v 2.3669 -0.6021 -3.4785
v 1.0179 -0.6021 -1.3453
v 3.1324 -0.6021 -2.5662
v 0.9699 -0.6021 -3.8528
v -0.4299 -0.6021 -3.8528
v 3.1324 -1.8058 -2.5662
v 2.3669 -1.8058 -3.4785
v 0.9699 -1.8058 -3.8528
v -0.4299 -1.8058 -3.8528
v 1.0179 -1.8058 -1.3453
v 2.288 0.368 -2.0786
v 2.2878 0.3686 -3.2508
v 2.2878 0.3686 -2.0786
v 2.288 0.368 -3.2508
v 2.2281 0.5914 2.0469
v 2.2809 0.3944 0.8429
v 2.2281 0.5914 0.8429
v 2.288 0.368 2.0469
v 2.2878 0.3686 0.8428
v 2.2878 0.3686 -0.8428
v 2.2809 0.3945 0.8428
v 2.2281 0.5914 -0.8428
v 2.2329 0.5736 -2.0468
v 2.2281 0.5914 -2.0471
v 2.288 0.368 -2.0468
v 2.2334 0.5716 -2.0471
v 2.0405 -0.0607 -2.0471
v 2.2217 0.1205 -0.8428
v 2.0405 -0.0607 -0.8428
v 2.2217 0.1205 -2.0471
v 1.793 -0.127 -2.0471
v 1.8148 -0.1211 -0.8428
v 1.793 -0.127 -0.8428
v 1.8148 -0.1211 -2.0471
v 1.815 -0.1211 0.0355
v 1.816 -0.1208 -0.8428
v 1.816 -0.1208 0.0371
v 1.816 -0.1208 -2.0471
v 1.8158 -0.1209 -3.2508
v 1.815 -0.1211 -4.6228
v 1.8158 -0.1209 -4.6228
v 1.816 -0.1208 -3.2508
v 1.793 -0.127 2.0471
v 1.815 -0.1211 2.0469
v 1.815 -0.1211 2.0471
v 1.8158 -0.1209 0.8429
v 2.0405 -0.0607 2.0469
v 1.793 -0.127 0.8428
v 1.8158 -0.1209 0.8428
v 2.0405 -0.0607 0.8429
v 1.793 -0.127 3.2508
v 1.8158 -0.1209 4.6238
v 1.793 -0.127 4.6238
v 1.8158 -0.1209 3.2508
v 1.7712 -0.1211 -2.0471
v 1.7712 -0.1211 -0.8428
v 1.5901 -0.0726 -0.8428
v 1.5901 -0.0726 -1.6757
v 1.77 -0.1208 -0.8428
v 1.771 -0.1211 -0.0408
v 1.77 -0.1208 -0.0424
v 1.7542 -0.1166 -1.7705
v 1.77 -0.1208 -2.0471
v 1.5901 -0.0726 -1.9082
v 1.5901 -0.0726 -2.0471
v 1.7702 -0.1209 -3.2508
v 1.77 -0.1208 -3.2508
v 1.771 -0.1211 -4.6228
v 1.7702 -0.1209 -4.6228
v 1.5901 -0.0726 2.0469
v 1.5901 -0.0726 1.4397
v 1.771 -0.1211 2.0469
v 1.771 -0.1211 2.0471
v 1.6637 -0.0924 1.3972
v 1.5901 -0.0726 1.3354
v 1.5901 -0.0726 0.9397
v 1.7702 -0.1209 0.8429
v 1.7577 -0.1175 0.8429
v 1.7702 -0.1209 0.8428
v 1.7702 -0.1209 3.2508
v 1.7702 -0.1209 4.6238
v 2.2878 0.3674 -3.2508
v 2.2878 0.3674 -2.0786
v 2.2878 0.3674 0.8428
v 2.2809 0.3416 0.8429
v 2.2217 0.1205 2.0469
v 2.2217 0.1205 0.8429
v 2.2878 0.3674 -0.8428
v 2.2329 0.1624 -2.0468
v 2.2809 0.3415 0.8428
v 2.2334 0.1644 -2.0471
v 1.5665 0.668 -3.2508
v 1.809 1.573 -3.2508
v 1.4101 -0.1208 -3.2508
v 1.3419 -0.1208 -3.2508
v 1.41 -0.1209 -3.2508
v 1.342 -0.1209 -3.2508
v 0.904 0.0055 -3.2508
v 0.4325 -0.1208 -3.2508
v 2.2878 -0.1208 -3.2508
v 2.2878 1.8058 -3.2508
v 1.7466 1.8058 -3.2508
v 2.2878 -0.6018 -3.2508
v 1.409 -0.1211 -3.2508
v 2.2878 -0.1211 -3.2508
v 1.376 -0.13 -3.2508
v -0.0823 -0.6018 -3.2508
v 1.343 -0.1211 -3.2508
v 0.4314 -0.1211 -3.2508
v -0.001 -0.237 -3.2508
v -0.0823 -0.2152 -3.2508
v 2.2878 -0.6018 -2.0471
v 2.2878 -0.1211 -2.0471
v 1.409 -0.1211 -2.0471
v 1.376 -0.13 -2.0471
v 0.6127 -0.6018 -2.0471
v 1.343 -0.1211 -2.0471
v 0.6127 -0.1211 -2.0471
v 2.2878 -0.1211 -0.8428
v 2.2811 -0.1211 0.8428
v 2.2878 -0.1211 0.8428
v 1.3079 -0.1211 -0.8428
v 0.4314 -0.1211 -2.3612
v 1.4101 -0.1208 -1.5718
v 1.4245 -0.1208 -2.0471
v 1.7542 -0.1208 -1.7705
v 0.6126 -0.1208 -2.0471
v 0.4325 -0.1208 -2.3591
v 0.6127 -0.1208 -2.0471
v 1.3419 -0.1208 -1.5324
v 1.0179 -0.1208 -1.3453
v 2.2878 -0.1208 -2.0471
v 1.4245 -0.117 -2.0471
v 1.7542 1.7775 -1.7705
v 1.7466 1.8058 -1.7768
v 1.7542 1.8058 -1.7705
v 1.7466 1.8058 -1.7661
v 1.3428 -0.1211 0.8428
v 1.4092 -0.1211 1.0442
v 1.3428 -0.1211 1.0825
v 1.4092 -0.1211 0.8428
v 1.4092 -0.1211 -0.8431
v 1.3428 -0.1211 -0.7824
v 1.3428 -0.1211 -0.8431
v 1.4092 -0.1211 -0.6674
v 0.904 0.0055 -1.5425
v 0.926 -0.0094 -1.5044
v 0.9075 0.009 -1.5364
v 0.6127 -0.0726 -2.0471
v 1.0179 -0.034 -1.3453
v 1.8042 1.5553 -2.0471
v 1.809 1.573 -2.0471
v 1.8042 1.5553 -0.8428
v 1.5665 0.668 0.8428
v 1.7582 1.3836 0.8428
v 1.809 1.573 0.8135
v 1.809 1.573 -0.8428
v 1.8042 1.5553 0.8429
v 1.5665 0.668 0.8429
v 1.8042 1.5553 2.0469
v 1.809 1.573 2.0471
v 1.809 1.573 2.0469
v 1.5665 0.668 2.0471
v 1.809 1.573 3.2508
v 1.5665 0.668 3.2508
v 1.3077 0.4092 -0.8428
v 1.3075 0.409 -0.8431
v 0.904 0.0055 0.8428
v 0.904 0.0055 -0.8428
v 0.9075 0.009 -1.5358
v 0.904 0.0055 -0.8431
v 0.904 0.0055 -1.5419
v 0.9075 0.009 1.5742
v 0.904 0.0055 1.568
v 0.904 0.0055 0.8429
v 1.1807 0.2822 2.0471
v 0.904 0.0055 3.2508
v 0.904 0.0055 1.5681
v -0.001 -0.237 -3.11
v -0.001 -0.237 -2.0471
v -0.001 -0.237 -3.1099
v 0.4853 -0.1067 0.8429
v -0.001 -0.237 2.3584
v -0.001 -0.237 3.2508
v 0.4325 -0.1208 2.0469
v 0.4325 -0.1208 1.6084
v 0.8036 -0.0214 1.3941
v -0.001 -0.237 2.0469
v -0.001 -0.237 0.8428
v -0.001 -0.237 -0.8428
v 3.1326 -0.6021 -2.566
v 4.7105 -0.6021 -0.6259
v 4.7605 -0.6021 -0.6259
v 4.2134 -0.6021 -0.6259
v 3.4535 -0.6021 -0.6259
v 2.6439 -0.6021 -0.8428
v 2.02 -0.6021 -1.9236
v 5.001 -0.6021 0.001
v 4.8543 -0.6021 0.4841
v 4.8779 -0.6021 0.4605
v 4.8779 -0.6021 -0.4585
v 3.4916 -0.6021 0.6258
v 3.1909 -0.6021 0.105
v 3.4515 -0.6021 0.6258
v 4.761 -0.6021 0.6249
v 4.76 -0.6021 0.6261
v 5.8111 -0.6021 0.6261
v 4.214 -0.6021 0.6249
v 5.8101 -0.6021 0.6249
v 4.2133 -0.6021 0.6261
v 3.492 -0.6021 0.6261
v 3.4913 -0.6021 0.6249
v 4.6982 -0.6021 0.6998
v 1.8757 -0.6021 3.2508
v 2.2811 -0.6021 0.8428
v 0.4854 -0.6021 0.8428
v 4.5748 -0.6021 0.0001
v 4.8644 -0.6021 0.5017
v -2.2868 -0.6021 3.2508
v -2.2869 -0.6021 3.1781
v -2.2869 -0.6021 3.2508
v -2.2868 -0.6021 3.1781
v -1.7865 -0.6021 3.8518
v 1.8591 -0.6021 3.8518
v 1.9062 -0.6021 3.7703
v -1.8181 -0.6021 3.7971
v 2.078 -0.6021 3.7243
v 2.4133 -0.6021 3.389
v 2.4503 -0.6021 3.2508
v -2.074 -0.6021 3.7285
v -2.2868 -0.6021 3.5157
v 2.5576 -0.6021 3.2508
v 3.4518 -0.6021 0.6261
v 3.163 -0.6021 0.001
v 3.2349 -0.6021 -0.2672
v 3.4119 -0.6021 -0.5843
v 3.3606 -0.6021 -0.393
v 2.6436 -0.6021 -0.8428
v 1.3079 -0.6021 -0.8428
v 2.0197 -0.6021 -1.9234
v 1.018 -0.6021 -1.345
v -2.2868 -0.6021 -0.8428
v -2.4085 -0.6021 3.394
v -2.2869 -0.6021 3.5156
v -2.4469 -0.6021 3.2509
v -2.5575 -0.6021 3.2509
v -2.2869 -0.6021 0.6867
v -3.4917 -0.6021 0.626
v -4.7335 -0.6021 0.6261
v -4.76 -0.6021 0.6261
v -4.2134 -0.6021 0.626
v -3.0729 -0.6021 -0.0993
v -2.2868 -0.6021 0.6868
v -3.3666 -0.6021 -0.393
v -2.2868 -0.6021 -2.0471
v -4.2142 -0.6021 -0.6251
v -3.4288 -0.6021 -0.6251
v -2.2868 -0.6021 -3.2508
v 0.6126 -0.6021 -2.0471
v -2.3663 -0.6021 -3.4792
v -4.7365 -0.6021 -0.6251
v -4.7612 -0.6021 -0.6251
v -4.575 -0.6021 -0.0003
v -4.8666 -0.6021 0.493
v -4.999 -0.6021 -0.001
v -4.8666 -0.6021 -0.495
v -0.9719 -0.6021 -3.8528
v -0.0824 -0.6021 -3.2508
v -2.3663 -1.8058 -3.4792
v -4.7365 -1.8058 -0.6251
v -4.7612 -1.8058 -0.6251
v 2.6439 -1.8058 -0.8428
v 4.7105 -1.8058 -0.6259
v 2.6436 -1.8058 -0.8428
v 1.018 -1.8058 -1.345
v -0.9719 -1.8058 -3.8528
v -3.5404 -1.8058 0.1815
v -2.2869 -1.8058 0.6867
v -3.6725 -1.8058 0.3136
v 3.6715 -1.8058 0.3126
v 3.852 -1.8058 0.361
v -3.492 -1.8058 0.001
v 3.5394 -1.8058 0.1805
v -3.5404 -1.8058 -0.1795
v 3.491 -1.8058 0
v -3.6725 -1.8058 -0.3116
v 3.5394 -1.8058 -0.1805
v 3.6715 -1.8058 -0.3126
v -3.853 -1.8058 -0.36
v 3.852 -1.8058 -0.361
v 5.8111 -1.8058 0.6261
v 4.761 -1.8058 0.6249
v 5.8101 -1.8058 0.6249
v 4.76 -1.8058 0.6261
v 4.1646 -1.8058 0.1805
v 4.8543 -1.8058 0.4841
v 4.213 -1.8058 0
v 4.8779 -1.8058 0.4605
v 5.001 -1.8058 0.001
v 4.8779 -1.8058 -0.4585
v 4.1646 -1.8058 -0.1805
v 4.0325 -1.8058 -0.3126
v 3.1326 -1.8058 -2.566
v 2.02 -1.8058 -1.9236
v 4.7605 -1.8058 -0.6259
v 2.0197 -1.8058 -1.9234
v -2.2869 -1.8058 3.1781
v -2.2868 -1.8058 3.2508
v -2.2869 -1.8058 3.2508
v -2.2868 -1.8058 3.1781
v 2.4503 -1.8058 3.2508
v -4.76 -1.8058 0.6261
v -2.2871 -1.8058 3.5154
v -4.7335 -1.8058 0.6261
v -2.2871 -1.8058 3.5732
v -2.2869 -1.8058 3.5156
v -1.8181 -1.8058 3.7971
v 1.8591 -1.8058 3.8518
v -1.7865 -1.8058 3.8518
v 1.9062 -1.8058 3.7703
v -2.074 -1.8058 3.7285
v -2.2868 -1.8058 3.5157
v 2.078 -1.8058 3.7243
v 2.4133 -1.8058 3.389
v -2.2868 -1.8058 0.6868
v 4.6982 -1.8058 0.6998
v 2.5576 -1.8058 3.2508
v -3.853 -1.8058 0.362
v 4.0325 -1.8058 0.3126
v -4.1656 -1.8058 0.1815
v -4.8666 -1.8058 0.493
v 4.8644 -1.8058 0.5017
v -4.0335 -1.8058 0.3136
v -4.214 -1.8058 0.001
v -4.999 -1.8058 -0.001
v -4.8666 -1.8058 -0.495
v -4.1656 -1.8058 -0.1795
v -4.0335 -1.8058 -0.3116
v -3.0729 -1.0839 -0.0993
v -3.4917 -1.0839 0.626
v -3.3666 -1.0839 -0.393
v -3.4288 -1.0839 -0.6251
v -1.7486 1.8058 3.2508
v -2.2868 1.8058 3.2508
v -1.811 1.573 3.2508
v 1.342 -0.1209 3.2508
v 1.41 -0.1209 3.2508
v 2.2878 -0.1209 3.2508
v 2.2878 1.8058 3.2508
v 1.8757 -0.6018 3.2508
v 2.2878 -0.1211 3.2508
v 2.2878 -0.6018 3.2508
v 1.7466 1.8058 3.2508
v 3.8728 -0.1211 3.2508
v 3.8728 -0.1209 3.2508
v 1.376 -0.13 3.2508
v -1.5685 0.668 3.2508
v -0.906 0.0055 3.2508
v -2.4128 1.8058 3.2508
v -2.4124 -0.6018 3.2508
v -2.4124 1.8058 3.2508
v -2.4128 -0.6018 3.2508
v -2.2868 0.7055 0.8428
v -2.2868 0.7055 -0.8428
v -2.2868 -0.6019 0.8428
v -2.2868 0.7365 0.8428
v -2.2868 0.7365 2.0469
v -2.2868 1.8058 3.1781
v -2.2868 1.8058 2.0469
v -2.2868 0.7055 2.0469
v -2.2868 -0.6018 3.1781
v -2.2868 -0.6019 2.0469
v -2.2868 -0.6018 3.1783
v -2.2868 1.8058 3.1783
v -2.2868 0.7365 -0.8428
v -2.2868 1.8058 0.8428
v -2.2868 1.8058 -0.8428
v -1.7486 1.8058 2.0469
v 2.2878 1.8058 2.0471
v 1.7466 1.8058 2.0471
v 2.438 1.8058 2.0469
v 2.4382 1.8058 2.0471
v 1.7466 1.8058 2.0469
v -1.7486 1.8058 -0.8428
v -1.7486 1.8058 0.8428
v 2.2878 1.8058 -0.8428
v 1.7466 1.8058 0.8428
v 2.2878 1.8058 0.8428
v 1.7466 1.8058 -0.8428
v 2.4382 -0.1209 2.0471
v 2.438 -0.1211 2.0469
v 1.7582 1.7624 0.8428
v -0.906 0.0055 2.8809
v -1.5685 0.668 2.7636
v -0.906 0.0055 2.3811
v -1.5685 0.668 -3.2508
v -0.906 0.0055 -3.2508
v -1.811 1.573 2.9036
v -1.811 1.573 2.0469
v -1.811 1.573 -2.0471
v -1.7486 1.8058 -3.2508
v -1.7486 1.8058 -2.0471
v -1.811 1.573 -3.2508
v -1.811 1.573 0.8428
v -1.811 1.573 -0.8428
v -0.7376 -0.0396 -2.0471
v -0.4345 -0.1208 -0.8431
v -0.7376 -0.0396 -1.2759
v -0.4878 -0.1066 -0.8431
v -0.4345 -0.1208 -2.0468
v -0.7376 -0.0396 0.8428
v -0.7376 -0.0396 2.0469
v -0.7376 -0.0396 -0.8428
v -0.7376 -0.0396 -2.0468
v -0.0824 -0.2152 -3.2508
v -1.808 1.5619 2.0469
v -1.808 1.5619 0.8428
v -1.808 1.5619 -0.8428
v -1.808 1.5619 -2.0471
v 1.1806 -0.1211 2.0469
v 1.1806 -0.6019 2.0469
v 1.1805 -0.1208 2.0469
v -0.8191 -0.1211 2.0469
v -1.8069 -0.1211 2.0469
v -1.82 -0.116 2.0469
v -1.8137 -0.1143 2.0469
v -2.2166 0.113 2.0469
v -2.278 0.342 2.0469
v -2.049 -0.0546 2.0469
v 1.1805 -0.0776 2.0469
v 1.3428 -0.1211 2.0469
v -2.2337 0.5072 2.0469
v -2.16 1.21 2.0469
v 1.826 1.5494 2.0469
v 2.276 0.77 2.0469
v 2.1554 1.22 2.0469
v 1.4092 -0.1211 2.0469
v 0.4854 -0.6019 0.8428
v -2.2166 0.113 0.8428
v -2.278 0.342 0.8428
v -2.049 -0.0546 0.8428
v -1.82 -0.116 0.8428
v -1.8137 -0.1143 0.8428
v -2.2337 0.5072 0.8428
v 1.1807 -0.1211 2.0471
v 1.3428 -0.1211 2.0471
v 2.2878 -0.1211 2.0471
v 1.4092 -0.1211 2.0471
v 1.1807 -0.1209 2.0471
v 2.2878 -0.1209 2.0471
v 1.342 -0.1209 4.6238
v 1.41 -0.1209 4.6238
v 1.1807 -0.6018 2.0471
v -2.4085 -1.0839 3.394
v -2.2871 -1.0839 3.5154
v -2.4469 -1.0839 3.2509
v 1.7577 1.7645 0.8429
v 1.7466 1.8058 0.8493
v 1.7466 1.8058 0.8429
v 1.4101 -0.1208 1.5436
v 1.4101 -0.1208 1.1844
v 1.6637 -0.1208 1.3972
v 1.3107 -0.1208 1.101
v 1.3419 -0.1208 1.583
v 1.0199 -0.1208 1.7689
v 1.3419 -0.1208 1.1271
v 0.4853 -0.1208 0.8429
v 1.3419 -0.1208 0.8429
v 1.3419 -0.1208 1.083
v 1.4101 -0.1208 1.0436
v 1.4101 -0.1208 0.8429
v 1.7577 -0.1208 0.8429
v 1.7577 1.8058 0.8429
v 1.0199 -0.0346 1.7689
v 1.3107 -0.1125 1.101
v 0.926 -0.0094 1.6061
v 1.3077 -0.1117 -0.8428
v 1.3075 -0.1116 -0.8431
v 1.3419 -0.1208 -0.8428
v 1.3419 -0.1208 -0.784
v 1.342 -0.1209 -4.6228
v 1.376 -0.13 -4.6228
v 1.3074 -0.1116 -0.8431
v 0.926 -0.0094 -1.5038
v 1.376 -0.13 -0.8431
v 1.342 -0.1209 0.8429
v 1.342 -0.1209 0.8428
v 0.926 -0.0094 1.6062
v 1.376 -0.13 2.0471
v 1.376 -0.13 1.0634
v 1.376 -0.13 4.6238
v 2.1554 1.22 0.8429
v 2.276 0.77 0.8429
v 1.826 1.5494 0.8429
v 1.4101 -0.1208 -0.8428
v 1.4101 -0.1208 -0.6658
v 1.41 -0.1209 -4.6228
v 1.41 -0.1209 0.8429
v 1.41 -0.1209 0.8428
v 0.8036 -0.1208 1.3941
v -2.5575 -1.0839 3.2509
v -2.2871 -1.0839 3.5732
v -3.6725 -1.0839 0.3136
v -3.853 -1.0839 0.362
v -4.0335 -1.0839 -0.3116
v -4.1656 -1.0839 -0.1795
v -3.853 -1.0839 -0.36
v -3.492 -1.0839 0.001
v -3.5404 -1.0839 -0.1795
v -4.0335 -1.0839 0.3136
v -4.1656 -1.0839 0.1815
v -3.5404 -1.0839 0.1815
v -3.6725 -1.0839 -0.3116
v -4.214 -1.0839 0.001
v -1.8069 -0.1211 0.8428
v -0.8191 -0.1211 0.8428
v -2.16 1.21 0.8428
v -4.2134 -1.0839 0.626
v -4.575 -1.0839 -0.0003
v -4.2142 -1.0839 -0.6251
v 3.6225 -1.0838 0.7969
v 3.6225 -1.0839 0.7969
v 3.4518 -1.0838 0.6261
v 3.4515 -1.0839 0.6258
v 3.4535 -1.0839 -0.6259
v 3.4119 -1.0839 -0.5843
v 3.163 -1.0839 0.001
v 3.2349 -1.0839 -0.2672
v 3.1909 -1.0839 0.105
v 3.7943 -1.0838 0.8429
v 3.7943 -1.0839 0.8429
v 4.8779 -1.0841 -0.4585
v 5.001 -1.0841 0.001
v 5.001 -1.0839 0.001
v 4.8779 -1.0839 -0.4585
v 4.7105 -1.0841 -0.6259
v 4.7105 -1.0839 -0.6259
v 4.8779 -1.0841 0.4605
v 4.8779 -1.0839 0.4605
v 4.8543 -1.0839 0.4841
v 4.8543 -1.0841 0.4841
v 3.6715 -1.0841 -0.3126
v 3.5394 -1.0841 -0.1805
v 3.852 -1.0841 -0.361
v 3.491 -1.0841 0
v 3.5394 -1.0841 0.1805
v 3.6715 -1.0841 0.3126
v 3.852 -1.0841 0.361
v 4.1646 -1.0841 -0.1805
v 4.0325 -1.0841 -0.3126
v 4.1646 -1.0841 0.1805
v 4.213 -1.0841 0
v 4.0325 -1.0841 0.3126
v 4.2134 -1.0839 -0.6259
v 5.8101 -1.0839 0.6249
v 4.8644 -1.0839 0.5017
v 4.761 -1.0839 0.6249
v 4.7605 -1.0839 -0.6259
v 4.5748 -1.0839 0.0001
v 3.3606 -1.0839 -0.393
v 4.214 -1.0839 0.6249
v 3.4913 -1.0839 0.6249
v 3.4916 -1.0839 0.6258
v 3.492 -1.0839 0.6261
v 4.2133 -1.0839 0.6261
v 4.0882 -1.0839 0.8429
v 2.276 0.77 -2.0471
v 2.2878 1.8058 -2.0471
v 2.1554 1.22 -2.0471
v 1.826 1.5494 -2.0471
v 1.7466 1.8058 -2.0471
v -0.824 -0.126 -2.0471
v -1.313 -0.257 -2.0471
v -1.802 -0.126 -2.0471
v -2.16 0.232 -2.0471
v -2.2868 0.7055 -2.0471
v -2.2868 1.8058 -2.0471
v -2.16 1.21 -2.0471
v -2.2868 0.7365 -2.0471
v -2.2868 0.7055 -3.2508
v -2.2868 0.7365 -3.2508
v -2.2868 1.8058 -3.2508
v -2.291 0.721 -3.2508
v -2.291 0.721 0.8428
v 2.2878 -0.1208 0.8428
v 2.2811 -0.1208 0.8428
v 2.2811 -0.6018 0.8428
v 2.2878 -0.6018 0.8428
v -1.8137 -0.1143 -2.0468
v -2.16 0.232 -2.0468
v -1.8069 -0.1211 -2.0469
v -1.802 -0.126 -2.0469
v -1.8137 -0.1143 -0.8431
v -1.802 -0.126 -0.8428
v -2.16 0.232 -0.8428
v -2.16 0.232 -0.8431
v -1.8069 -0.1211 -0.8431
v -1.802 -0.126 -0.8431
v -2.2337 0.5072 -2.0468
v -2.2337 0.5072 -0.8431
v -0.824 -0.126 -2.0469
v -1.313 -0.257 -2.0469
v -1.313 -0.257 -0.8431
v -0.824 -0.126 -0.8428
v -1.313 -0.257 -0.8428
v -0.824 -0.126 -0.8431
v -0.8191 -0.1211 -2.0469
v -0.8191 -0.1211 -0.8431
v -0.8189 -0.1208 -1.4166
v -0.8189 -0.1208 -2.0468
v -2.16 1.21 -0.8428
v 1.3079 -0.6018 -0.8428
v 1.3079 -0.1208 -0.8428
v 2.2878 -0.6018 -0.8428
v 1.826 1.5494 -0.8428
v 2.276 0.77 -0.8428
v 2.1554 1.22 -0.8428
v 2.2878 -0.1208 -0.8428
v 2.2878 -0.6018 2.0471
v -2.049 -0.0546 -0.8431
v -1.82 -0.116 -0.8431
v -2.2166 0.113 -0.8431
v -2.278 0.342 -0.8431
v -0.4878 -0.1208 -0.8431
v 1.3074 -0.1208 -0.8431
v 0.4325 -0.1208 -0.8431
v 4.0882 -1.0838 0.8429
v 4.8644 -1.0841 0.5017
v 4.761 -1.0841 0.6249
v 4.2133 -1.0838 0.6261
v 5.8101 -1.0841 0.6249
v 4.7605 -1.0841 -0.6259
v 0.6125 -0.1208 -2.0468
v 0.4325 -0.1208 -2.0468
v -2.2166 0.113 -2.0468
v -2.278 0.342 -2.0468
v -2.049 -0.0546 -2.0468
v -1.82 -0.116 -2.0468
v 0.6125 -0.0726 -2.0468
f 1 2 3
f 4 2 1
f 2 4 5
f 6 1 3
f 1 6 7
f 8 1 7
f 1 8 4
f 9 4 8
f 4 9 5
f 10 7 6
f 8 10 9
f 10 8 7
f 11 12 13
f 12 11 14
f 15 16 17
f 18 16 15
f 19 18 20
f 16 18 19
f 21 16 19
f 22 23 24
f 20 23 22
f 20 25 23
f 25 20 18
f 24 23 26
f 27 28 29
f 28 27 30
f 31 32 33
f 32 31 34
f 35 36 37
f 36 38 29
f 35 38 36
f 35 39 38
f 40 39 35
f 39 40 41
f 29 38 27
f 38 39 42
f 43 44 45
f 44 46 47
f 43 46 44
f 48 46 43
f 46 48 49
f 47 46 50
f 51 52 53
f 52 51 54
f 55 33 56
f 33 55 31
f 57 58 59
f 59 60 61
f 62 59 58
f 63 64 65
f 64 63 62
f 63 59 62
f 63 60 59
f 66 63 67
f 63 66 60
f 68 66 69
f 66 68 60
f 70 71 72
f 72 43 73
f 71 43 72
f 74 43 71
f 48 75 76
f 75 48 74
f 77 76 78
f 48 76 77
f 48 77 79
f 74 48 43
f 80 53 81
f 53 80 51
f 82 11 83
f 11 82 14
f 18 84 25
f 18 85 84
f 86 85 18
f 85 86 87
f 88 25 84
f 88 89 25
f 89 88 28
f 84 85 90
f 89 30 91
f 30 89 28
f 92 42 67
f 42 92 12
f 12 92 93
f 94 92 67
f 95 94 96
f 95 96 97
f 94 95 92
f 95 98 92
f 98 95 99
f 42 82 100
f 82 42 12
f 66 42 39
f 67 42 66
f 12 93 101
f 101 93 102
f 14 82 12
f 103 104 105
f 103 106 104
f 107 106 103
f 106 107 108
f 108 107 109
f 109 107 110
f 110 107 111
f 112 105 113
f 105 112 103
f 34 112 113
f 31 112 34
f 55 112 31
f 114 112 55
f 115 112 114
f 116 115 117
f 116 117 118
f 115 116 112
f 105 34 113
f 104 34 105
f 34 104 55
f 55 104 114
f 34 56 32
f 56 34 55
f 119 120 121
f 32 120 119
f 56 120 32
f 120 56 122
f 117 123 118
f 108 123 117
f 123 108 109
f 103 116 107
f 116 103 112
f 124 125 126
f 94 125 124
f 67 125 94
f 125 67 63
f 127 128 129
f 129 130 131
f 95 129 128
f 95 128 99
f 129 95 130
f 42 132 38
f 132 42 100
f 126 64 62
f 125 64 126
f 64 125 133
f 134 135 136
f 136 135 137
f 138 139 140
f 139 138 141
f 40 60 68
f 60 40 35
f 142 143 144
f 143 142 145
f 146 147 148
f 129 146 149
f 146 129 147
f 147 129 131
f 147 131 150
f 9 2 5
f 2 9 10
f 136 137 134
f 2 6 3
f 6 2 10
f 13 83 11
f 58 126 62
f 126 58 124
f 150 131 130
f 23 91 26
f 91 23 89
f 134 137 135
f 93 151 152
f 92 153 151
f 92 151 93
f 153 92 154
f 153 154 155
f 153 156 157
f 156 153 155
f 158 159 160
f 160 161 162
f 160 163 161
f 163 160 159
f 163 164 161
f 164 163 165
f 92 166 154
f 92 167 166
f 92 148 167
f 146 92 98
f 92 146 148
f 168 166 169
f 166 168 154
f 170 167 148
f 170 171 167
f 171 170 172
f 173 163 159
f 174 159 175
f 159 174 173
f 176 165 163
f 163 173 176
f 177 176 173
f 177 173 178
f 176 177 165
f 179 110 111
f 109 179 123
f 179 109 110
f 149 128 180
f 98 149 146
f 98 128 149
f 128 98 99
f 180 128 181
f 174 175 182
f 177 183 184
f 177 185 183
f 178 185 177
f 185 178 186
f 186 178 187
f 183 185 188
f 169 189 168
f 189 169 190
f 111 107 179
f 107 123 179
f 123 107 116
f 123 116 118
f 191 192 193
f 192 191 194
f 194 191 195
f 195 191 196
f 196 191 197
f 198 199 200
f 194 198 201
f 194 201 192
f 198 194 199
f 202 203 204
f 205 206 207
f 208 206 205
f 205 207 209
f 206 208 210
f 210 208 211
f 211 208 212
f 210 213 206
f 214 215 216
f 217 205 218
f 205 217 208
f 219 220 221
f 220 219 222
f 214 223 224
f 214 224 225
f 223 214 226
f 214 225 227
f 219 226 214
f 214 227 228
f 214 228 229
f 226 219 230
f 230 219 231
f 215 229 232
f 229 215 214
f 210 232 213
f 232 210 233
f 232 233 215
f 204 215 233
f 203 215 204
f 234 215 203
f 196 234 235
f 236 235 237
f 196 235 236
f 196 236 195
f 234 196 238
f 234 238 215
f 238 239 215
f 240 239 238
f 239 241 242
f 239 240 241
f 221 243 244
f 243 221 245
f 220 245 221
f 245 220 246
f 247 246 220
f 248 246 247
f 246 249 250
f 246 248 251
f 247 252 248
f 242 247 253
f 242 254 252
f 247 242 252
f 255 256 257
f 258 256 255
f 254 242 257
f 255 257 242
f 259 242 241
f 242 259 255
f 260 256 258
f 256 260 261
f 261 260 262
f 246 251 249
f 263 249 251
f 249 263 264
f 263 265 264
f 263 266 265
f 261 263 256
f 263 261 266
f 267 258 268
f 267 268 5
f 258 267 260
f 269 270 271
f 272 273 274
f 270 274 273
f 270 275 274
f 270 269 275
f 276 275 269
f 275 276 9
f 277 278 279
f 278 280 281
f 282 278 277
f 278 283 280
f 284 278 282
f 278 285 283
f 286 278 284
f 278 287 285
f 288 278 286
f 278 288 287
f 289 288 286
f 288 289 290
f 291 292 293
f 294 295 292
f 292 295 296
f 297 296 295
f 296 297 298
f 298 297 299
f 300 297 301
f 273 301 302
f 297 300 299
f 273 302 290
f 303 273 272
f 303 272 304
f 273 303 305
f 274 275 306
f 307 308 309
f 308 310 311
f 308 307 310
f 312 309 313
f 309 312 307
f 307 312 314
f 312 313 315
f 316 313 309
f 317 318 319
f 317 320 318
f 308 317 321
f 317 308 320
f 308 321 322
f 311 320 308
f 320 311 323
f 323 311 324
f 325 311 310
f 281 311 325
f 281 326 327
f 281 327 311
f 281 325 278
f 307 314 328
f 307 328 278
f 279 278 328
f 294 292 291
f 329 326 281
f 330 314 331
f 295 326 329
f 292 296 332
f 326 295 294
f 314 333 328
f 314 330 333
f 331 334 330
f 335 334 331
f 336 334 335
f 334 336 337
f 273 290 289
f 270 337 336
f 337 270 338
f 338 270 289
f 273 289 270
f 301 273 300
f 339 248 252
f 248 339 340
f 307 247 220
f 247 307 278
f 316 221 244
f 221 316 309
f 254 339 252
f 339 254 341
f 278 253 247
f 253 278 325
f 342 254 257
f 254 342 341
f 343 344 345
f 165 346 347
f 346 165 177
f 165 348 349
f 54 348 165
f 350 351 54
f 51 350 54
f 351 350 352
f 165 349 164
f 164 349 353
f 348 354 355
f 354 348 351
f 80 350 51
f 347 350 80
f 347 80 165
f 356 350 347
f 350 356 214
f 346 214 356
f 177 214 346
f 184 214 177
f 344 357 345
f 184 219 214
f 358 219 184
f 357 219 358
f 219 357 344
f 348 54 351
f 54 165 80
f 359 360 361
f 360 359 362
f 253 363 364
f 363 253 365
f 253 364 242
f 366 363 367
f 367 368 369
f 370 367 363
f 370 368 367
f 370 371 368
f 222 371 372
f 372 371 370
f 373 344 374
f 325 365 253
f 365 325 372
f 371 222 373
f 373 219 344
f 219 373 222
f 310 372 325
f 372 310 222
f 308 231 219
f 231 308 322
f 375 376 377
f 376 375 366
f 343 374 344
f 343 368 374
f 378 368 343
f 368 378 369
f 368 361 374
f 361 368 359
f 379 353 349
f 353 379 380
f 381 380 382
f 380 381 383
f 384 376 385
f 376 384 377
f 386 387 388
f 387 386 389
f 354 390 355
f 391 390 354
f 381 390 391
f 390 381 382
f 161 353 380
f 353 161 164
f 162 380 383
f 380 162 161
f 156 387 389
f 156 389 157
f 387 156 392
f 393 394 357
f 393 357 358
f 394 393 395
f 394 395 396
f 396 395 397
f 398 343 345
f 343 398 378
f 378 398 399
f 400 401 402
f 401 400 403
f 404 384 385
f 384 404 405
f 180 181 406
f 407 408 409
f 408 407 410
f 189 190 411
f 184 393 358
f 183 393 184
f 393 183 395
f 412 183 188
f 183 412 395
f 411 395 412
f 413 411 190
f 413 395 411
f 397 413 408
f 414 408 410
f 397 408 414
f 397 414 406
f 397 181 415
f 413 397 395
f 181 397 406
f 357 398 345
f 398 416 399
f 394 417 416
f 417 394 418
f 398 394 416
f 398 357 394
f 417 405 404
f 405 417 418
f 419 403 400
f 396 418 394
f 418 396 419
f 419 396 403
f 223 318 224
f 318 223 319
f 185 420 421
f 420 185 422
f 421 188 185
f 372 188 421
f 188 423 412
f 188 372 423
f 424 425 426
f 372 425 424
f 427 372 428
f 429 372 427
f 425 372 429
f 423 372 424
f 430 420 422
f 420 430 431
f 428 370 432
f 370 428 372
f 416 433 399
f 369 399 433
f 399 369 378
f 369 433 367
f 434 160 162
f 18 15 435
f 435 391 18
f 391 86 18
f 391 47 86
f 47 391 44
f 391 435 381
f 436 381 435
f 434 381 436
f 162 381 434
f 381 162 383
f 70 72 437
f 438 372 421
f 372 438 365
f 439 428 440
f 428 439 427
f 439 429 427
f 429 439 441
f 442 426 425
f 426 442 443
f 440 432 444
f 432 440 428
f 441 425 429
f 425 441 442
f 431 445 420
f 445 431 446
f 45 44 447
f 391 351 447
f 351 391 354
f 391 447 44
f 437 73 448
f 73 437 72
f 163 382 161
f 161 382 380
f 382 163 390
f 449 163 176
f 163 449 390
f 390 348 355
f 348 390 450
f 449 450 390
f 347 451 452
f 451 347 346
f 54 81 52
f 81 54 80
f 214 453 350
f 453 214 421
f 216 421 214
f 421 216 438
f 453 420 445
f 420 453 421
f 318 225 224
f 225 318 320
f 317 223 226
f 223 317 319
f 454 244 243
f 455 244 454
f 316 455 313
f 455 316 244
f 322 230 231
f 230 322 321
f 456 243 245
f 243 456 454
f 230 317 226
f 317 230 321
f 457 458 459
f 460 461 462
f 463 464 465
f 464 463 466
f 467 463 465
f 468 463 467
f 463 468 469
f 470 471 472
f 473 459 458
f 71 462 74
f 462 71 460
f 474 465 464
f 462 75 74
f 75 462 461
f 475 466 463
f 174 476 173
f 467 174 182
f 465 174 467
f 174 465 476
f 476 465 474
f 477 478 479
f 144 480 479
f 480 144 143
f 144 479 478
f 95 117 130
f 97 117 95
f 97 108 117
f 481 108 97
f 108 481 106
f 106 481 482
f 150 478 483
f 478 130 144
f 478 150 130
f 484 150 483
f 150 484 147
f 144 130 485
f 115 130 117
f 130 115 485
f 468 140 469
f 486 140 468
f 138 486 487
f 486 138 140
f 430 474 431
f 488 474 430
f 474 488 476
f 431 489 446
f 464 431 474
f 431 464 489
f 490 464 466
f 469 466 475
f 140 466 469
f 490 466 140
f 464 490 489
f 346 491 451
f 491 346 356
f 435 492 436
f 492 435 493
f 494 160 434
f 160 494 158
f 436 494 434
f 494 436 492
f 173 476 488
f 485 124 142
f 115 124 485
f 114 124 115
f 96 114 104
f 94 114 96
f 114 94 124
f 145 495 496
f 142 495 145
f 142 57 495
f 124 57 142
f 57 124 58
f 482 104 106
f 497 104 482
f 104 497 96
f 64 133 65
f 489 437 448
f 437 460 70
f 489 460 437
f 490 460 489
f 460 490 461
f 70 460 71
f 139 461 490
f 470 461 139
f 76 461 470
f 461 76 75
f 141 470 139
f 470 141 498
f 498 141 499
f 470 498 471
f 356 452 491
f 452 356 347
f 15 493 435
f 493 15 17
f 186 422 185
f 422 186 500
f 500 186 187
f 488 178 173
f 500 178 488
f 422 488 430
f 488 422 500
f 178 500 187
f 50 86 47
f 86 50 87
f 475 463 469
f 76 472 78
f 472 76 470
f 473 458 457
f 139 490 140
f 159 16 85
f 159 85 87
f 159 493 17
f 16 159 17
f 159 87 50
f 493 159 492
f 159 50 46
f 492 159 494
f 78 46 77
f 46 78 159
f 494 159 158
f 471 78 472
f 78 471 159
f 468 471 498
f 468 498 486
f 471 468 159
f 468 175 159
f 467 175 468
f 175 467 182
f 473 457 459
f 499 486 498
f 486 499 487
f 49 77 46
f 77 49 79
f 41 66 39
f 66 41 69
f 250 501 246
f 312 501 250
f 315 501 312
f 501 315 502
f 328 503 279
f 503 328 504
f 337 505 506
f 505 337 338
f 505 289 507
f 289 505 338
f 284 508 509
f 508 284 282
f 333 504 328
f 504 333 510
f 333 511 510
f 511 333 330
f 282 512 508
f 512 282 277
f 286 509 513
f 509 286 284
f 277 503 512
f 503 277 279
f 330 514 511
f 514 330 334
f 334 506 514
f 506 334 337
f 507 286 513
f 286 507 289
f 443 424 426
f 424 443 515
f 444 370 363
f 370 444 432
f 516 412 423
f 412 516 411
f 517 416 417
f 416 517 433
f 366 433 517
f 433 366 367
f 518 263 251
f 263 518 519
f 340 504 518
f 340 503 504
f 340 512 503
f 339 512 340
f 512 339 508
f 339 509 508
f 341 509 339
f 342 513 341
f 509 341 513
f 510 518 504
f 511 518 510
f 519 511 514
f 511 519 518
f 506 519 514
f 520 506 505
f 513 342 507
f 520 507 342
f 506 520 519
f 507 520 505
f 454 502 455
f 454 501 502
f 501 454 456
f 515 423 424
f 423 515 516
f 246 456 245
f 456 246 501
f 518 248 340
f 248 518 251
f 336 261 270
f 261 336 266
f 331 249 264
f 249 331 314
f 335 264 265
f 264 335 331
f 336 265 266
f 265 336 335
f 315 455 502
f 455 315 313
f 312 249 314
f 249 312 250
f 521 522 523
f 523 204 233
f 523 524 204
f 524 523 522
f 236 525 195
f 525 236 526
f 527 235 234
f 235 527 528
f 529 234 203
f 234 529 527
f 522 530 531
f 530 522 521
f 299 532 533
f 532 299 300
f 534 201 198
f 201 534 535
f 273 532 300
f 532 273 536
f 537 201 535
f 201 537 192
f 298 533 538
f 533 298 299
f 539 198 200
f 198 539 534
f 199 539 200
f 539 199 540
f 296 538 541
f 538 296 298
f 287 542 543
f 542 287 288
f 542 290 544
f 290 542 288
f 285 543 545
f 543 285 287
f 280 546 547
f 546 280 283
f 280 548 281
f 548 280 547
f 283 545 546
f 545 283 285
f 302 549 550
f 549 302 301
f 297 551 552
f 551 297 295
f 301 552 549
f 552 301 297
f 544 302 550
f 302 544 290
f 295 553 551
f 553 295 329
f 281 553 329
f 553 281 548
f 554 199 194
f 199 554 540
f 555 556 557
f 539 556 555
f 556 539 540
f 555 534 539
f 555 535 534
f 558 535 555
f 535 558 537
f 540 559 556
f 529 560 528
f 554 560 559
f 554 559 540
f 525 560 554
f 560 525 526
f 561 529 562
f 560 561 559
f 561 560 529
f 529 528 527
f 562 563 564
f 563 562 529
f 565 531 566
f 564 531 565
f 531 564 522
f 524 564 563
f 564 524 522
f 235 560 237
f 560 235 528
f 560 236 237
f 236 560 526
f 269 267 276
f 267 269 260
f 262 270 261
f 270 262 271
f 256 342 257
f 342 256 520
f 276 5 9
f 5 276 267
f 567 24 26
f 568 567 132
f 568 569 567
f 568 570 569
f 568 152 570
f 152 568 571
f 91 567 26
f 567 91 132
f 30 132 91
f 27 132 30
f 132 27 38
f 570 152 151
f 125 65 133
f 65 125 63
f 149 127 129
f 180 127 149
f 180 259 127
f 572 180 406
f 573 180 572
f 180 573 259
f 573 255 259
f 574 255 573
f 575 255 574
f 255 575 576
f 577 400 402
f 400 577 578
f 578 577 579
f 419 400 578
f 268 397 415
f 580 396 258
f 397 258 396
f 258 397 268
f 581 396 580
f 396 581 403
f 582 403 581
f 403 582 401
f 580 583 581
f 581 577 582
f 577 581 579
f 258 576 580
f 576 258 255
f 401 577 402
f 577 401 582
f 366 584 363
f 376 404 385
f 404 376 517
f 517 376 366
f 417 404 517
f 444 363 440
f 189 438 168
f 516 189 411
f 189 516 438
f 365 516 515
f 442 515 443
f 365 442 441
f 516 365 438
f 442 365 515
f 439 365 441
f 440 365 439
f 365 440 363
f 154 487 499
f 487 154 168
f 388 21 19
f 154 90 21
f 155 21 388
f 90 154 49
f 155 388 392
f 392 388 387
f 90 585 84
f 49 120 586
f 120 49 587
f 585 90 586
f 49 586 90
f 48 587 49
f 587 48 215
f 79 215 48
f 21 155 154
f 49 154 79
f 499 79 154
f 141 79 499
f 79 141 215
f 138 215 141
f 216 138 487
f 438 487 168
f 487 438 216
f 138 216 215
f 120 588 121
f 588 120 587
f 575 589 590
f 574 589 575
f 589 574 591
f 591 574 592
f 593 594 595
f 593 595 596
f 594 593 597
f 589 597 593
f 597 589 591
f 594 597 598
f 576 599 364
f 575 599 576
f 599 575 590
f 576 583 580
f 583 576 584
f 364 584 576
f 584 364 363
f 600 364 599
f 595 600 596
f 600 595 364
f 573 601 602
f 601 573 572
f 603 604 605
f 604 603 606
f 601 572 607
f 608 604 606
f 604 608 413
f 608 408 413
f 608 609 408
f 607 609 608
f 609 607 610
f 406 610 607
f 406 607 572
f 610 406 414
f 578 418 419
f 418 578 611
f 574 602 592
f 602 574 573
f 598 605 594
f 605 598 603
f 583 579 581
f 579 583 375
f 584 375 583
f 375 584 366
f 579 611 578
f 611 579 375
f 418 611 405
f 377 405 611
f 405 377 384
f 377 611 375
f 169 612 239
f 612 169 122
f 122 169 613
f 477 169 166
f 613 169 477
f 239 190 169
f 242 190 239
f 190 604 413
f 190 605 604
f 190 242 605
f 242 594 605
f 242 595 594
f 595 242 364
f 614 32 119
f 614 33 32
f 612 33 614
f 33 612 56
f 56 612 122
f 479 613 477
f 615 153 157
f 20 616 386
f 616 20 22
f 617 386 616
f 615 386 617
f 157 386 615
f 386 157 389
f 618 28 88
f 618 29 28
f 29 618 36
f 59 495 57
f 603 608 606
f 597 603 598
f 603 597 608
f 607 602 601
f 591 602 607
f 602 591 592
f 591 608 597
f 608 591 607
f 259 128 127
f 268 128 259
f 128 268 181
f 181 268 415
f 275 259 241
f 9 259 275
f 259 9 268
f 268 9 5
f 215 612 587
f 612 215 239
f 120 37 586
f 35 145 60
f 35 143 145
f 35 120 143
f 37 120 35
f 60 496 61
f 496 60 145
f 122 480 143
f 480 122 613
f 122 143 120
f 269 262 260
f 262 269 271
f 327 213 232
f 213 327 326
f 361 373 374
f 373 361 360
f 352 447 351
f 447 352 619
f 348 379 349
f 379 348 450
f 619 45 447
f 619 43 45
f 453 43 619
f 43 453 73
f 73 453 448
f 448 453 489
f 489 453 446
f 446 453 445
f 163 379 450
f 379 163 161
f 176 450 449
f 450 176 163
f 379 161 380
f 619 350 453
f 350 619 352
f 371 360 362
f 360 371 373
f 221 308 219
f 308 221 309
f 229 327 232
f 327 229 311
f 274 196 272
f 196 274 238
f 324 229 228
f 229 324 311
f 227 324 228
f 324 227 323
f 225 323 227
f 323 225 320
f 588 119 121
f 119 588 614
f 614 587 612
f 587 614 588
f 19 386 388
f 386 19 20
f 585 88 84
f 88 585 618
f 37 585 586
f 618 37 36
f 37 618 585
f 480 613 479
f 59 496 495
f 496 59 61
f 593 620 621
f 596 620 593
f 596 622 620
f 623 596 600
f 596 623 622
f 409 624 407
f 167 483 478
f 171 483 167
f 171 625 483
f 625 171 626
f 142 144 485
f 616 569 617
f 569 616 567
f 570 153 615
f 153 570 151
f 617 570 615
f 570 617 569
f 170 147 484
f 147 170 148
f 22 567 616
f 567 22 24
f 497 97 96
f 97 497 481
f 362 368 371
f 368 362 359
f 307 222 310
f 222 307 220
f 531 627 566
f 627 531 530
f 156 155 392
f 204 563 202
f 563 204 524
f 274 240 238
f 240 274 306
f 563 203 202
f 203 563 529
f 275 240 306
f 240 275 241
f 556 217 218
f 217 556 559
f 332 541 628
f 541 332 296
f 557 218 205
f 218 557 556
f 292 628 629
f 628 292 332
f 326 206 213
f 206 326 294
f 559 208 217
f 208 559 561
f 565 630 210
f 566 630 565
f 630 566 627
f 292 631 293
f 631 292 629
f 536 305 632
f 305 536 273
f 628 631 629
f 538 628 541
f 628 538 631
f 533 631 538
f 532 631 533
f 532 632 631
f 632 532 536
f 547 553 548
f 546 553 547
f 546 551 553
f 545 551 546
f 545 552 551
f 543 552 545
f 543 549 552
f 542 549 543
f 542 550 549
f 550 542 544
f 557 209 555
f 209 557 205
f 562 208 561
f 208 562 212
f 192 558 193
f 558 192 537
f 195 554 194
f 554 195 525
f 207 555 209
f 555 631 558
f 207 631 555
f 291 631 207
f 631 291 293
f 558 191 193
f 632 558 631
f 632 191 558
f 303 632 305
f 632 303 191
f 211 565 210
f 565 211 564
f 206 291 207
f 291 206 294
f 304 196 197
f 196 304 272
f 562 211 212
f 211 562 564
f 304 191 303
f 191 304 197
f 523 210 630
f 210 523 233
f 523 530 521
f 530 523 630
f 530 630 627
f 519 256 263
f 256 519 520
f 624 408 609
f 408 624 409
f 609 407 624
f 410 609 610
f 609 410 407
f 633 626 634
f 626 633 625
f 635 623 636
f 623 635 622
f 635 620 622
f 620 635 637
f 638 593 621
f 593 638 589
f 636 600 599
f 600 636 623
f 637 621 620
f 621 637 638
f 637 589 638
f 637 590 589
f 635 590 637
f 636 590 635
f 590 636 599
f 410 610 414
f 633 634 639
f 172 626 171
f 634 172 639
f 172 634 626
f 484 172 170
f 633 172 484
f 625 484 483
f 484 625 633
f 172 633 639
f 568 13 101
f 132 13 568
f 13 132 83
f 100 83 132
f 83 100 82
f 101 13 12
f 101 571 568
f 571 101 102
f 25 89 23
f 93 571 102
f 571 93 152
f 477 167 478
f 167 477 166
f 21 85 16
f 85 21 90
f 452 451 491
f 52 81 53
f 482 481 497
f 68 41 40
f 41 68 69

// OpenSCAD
intersection() {
  union() {
    intersection() {
      union() {
        translate([-0.001, 1.573, 8.0265])
        cylinder(h = 20.1467, r1 = 1.81, r2 = 1.81, center = true, $fn = 12);
      
        translate([8.51043, 8.9895, -4.9135])
        rotate([90, 30, 0])
        cube(size = [16.5457, 36.1997, 18.2207], center = true);
      }
    
      union() {
        translate([-4.011, -9.953, -0.001])
        rotate([180, 90, -90])
        cylinder(h = 16.2937, r1 = 0.988, r2 = 0.988, center = true, $fn = 12);
      
        translate([-1.82, 0.342, -10.9765])
        cylinder(h = 14.2467, r1 = 0.458, r2 = 0.458, center = true, $fn = 12);
      }
    }
  
    intersection() {
      union() {
        translate([1.793, 0.368, 7.4245])
        cylinder(h = 21.3507, r1 = 0.495, r2 = 0.495, center = true, $fn = 12);
      
        intersection() {
          difference() {
            translate([8.51043, -9.351, -4.9135])
            rotate([90, 30, 0])
            cube(size = [16.5457, 36.1997, 17.4977], center = true);
          
            translate([8.48356, 0, -7.11855])
            rotate([90, 40, 0])
            cube(size = [14.0508, 36.1998, 3.6118], center = true);
          }
        
          translate([-0.001, 0, 1.858])
          rotate([180, 90, -90])
          cylinder(h = 36.1997, r1 = 5.971, r2 = 5.971, center = true, $fn = 12);
        
          translate([0, -1.204, 7.1235])
          cube(size = [36.1997, 1.2037, 21.9527], center = true);
        }
      
        translate([-7.906, -0.3615, -2.649])
        cube(size = [20.3877, 0.4807, 1.2037], center = true);
      
        translate([-5.01889, 8.9895, 5.98128])
        rotate([-90, -40, 0])
        cube(size = [36.1997, 20.5837, 18.2207], center = true);
      
        translate([1.793, 0.368, -2.649])
        cylinder(h = 1.2037, r1 = 0.495, r2 = 0.495, center = true, $fn = 12);
      }
    
      union() {
        intersection() {
          difference() {
            translate([8.51043, 0, -4.9135])
            rotate([90, 30, 0])
            cube(size = [16.5457, 36.1997, 3.6117], center = true);
          
            translate([-7.906, -0.3615, 7.4245])
            cube(size = [20.3878, 0.4808, 21.3508], center = true);
          }
        
          difference() {
            translate([3.82143, -8.147, -13.0351])
            rotate([90, 30, 0])
            cube(size = [16.5457, 17.4437, 19.9057], center = true);
          
            translate([-0.001, 1.573, 0])
            cylinder(h = 36.1998, r1 = 1.81, r2 = 1.81, center = true, $fn = 12);
          }
        }
      
        difference() {
          union() {
            translate([0, -0.3615, -3.552])
            cube(size = [36.1997, 0.4807, 0.6017], center = true);
          
            translate([8.51043, -0.3615, -4.9135])
            rotate([90, 30, 0])
            cube(size = [16.5457, 36.1997, 0.4807], center = true);
          }
        
          union() {
            translate([-0.001, 1.573, -2.95])
            cylinder(h = 1.8058, r1 = 1.81, r2 = 1.81, center = true, $fn = 12);
          
            translate([1.376, 0.77, 8.0265])
            rotate([180, 0, 180])
            cylinder(h = 20.1468, r1 = 0.9, r2 = 0.9, center = true, $fn = 12);
          }
        }
      }
    }
  
    difference() {
      union() {
        difference() {
          translate([0.357235, -1.204, 0.20625])
          rotate([-90, -30, 0])
          cube(size = [6.2467, 36.1997, 1.2037], center = true);
        
          translate([7.9065, -1.204, 0])
          cube(size = [20.3868, 1.2038, 36.1998], center = true);
        }
      
        difference() {
          union() {
            translate([-0.003, -1.204, -2.335])
            rotate([180, 90, -90])
            cylinder(h = 1.2037, r1 = 3.884, r2 = 3.884, center = true, $fn = 12);
          
            translate([7.9065, 0, 1.3125])
            cube(size = [20.3867, 3.6117, 3.8767], center = true);
          }
        
          union() {
            translate([5.81691, 4.44089e-16, -6.93232])
            rotate([-90, -40, 0])
            cube(size = [36.1998, 18.1008, 3.6118], center = true);
          
            translate([-0.001, 1.573, 1.3125])
            cylinder(h = 3.8768, r1 = 1.81, r2 = 1.81, center = true, $fn = 12);
          }
        }
      
        difference() {
          translate([7.9065, -1.204, 2.9495])
          cube(size = [20.3867, 1.2037, 1.8047], center = true);
        
          translate([-1.617, -0.3615, 2.937])
          rotate([180, 90, -90])
          cylinder(h = 0.4808, r1 = 0.914, r2 = 0.914, center = true, $fn = 12);
        }
      }
    
      union() {
        difference() {
          translate([7.9065, 0.602, 1.3365])
          cube(size = [20.3868, 2.4078, 1.4208], center = true);
        
          translate([-1.82, 0.342, 1.3365])
          cylinder(h = 1.4209, r1 = 0.458, r2 = 0.458, center = true, $fn = 12);
        }
      
        difference() {
          union() {
            translate([0, -9.1105, -7.124])
            cube(size = [36.1998, 17.9788, 21.9518], center = true);
          
            translate([0, 0.8425, 2.649])
            cube(size = [36.1998, 1.9268, 1.2038], center = true);
          }
        
          intersection() {
            translate([-7.83796, 0, 4.52525])
            rotate([90, 30, 0])
            cube(size = [18.0989, 36.1999, 3.6119], center = true);
          
            translate([-0.184463, -8.147, -0.1065])
            rotate([-90, -30, 0])
            cube(size = [7.4979, 36.1999, 19.9059], center = true);
          }
        }
      
        difference() {
          translate([-9.34138, -9.351, 5.39325])
          rotate([90, 30, 0])
          cube(size = [14.6268, 36.1998, 17.4978], center = true);
        
          translate([-1.617, -1.204, 2.937])
          rotate([180, 90, -90])
          cylinder(h = 1.2039, r1 = 0.914, r2 = 0.914, center = true, $fn = 12);
        }
      }
    }
  
    difference() {
      union() {
        translate([1.376, 0.77, 8.6285])
        rotate([180, 0, 180])
        cylinder(h = 18.9427, r1 = 0.9, r2 = 0.9, center = true, $fn = 12);
      
        translate([-2.91071, 0.8425, 13.0595])
        rotate([90, 30, 0])
        cube(size = [18.0987, 16.4907, 1.9267], center = true);
      
        translate([1.793, 0.368, 0])
        cylinder(h = 36.1997, r1 = 0.495, r2 = 0.495, center = true, $fn = 12);
      
        translate([3.71435, 0.8425, -11.6656])
        rotate([90, 30, 0])
        cube(size = [18.1007, 19.7087, 1.9267], center = true);
      
        difference() {
          union() {
            translate([-0.001, 1.573, 9.4715])
            cylinder(h = 17.2567, r1 = 1.81, r2 = 1.81, center = true, $fn = 12);
          
            translate([-4.0145, 0.8425, -6.95332])
            rotate([90, 30, 0])
            cube(size = [36.1997, 20.1417, 1.9267], center = true);
          }
        
          union() {
            translate([-4.58382, 8.147, -5.46695])
            rotate([-90, -40, 0])
            cube(size = [22.1488, 2.4848, 19.9058], center = true);
          
            translate([-11.8525, 8.749, -2.42807])
            rotate([90, 30, 0])
            cube(size = [18.0988, 20.1418, 18.7018], center = true);
          }
        }
      }
    
      union() {
        translate([-4.12275, -0.9635, -7.14081])
        rotate([90, 30, 0])
        cube(size = [36.1998, 19.7088, 1.6848], center = true);
      
        translate([0, 0.8425, -8.6285])
        cube(size = [36.1998, 1.9268, 18.9428], center = true);
      
        translate([-0.001, 1.573, 0])
        cylinder(h = 36.1998, r1 = 1.81, r2 = 1.81, center = true, $fn = 12);
      
        translate([0, 0.8425, 10.0735])
        cube(size = [36.1998, 1.9268, 16.0528], center = true);
      }
    }
  
    intersection() {
      union() {
        difference() {
          translate([5.38185, -9.1105, -4.5159])
          rotate([90, 40, 0])
          cube(size = [22.1487, 36.1997, 17.9787], center = true);
        
          translate([-3.853, 8.147, 0.001])
          rotate([180, 90, -90])
          cylinder(h = 19.9058, r1 = 0.361, r2 = 0.361, center = true, $fn = 12);
        }
      
        intersection() {
          translate([-1.313, 0.721, 1.9385])
          cylinder(h = 2.6247, r1 = 0.978, r2 = 0.978, center = true, $fn = 12);
        
          translate([7.9065, 0.361, 1.3125])
          cube(size = [20.3867, 2.8897, 3.8767], center = true);
        }
      }
    
      difference() {
        difference() {
          translate([0, 0, -7.124])
          cube(size = [36.1997, 36.1997, 21.9517], center = true);
        
          translate([-0.001, 1.573, 1.9385])
          cylinder(h = 2.6248, r1 = 1.81, r2 = 1.81, center = true, $fn = 12);
        }
      
        difference() {
          translate([6.12193, -0.6025, -3.5345])
          rotate([90, 30, 0])
          cube(size = [22.0618, 36.1998, 0.9628], center = true);
        
          translate([-10.1935, -0.6025, 1.9385])
          cube(size = [15.8129, 0.9629, 2.6249], center = true);
        }
      }
    
      union() {
        translate([7.9065, 0.361, 2.2395])
        cube(size = [20.3867, 2.8897, 3.2267], center = true);
      
        intersection() {
          union() {
            translate([-4.011, -1.204, -0.001])
            rotate([180, 90, -90])
            cylinder(h = 1.2037, r1 = 0.988, r2 = 0.988, center = true, $fn = 12);
          
            translate([-10.1935, 0, 2.2395])
            cube(size = [15.8127, 3.6117, 3.2267], center = true);
          }
        
          union() {
            translate([-6.3064, -9.351, -3.641])
            rotate([-90, -30, 0])
            cube(size = [21.6357, 36.1997, 17.4977], center = true);
          
            translate([-7.83796, 0.8425, 4.52525])
            rotate([90, 30, 0])
            cube(size = [18.0987, 36.1997, 1.9267], center = true);
          }
        }
      }
    }
  
    difference() {
      difference() {
        translate([4.082, -1.204, 0.001])
        rotate([180, 90, -90])
        cylinder(h = 1.2037, r1 = 0.919, r2 = 0.919, center = true, $fn = 12);
      
        translate([3.852, 8.147, -1.809e-15])
        rotate([180, 90, -90])
        cylinder(h = 19.9058, r1 = 0.361, r2 = 0.361, center = true, $fn = 12);
      }
    
      difference() {
        translate([-6.12193, 8.508, 3.5345])
        rotate([90, 30, 0])
        cube(size = [22.0618, 36.1998, 19.1838], center = true);
      
        translate([-0.003, 8.508, -2.335])
        rotate([180, 90, -90])
        cylinder(h = 19.1839, r1 = 3.884, r2 = 3.884, center = true, $fn = 12);
      }
    }
  
    difference() {
      union() {
        translate([7.9065, 0, -2.649])
        cube(size = [20.3867, 3.6117, 1.2037], center = true);
      
        translate([-1.313, 0.721, -1.204])
        cylinder(h = 4.0937, r1 = 0.978, r2 = 0.978, center = true, $fn = 12);
      
        intersection() {
          translate([-0.001, -0.9635, 1.858])
          rotate([180, 90, -90])
          cylinder(h = 1.6847, r1 = 5.971, r2 = 5.971, center = true, $fn = 12);
        
          translate([0, -9.351, -2.239])
          cube(size = [36.1997, 17.4977, 3.2277], center = true);
        }
      
        translate([7.9065, 0, 0])
        cube(size = [20.3867, 3.6117, 1.6857], center = true);
      }
    
      union() {
        translate([-0.001, 1.573, 0])
        cylinder(h = 36.1998, r1 = 1.81, r2 = 1.81, center = true, $fn = 12);
      
        translate([0, -0.3615, -1.445])
        cube(size = [36.1998, 0.4808, 1.2038], center = true);
      
        translate([8.51043, 0, -4.9135])
        rotate([90, 30, 0])
        cube(size = [16.5458, 36.1998, 36.1998], center = true);
      
        translate([-8.48356, -0.9635, -7.11855])
        rotate([-90, -40, 0])
        cube(size = [14.0508, 36.1998, 1.6848], center = true);
      }
    }
  
    difference() {
      union() {
        translate([1.62, -1.204, 2.931])
        rotate([180, 90, -90])
        cylinder(h = 1.2037, r1 = 0.916, r2 = 0.916, center = true, $fn = 12);
      
        intersection() {
          difference() {
            translate([-10.4007, -4.44089e-16, 1.46537])
            rotate([-90, -40, 0])
            cube(size = [22.1487, 20.5837, 3.6117], center = true);
          
            translate([-6.92521, 0.602, 6.10618])
            rotate([90, 30, 0])
            cube(size = [18.0988, 0.4328, 2.4078], center = true);
          }
        
          union() {
            translate([-7.906, 8.749, 2.649])
            cube(size = [20.3877, 18.7017, 1.2037], center = true);
          
            translate([0, -9.351, 1.204])
            cube(size = [36.1997, 17.4977, 4.0937], center = true);
          }
        }
      
        translate([-7.906, -0.3615, 0])
        cube(size = [20.3877, 0.4807, 1.6857], center = true);
      
        translate([-7.906, 0.8425, 0])
        cube(size = [20.3877, 1.9267, 1.6857], center = true);
      
        translate([1.376, 0.77, -9.4715])
        rotate([180, 0, 180])
        cylinder(h = 17.2567, r1 = 0.9, r2 = 0.9, center = true, $fn = 12);
      }
    
      intersection() {
        union() {
          translate([-0.001, 1.573, 0])
          cylinder(h = 36.1998, r1 = 1.81, r2 = 1.81, center = true, $fn = 12);
        
          translate([1.23372, 8.9895, -12.4])
          rotate([-90, -40, 0])
          cube(size = [22.1488, 15.6158, 18.2208], center = true);
        
          translate([-11.9607, -4.44089e-16, -2.61556])
          rotate([90, 30, 0])
          cube(size = [18.0988, 19.7088, 3.6118], center = true);
        
          translate([10.194, 8.147, -8.6285])
          cube(size = [15.8118, 19.9058, 18.9428], center = true);
        }
      
        union() {
          difference() {
            translate([-7.906, 0, -7.4245])
            cube(size = [20.3878, 3.6118, 21.3508], center = true);
          
            translate([8.74985, 0, -2.94382])
            rotate([90, 30, 0])
            cube(size = [18.1009, 0.4329, 36.1999], center = true);
          }
        
          translate([1.23372, 6.66134e-16, -12.4])
          rotate([-90, -40, 0])
          cube(size = [22.1488, 15.6158, 3.6118], center = true);
        
          translate([4.082, 8.147, 0.001])
          rotate([180, 90, -90])
          cylinder(h = 19.9058, r1 = 0.919, r2 = 0.919, center = true, $fn = 12);
        }
      }
    }
  
    difference() {
      intersection() {
        translate([0, -9.351, -8.737])
        cube(size = [36.1997, 17.4977, 18.7257], center = true);
      
        translate([-2.30263, 8.147, 11.4007])
        rotate([90, 30, 0])
        cube(size = [20.8107, 18.7557, 19.9057], center = true);
      }
    
      difference() {
        translate([2.88949, -1.204, -1.66825])
        rotate([90, 30, 0])
        cube(size = [1.2508, 36.1998, 1.2038], center = true);
      
        translate([0, -9.351, -9.363])
        cube(size = [36.1999, 17.4979, 17.4739], center = true);
      }
    }
  
    difference() {
      intersection() {
        translate([7.25049, -9.351, 5.88522])
        rotate([90, 30, 0])
        cube(size = [1.2507, 18.7557, 17.4977], center = true);
      
        translate([-5.38185, 8.147, -4.5159])
        rotate([-90, -40, 0])
        cube(size = [22.1487, 36.1997, 19.9057], center = true);
      }
    
      intersection() {
        translate([4.082, 8.147, 0.001])
        rotate([180, 90, -90])
        cylinder(h = 19.9058, r1 = 0.919, r2 = 0.919, center = true, $fn = 12);
      
        translate([-6.12193, 8.147, -3.5345])
        rotate([-90, -30, 0])
        cube(size = [22.0618, 36.1998, 19.9058], center = true);
      }
    }
  
    difference() {
      translate([13.3724, -1.204, 2.35072])
      rotate([90, 30, 0])
      cube(size = [15.3887, 18.7557, 1.2037], center = true);
    
      intersection() {
        union() {
          translate([0, -1.445, -0.0005])
          cube(size = [36.1998, 0.7218, 1.2508], center = true);
        
          translate([0, 8.508, -0.0005])
          cube(size = [36.1998, 19.1838, 1.2508], center = true);
        
          translate([8.48356, 0, -7.11855])
          rotate([90, 40, 0])
          cube(size = [14.0508, 36.1998, 36.1998], center = true);
        
          translate([0, 0, 9.363])
          cube(size = [36.1998, 36.1998, 17.4738], center = true);
        }
      
        union() {
          sphere(r = 54.2998, $fn = 108);
        
          translate([4.082, 8.749, 0.001])
          rotate([180, 90, -90])
          cylinder(h = 18.7018, r1 = 0.919, r2 = 0.919, center = true, $fn = 12);
        }
      }
    }
  
    intersection() {
      difference() {
        translate([0, -0.843, 9.363])
        cube(size = [36.1997, 0.4817, 17.4737], center = true);
      
        translate([-4.689, 8.508, -8.12159])
        rotate([90, 30, 0])
        cube(size = [36.1998, 17.4438, 19.1838], center = true);
      }
    
      translate([4.082, 8.147, 0.001])
      rotate([180, 90, -90])
      cylinder(h = 19.9057, r1 = 0.919, r2 = 0.919, center = true, $fn = 12);
    }
  
    intersection() {
      translate([-9.55313, 0, -5.5155])
      rotate([-90, -30, 0])
      cube(size = [14.1377, 36.1997, 36.1997], center = true);
    
      translate([-10.1935, -1.204, -0.602])
      cube(size = [15.8127, 1.2037, 2.8897], center = true);
    
      translate([-4.011, -1.204, -0.001])
      rotate([180, 90, -90])
      cylinder(h = 1.2037, r1 = 0.988, r2 = 0.988, center = true, $fn = 12);
    
      translate([0, 0, -0.602])
      cube(size = [36.1997, 36.1997, 2.8897], center = true);
    }
  
    intersection() {
      translate([-7.16463, -8.147, 4.1365])
      rotate([90, 30, 0])
      cube(size = [19.6537, 36.1997, 19.9057], center = true);
    
      union() {
        translate([0.672902, 8.9895, -0.3885])
        rotate([90, 30, 0])
        cube(size = [1.5557, 36.1997, 18.2207], center = true);
      
        translate([-1.82, 0.342, -1.445])
        cylinder(h = 1.2037, r1 = 0.458, r2 = 0.458, center = true, $fn = 12);
      }
    
      difference() {
        difference() {
          translate([7.9065, 0.8425, -1.445])
          cube(size = [20.3867, 1.9267, 1.2037], center = true);
        
          translate([-0.001, 1.573, -1.3365])
          cylinder(h = 1.4208, r1 = 1.81, r2 = 1.81, center = true, $fn = 12);
        }
      
        translate([-7.83796, 9.953, 4.52525])
        rotate([90, 30, 0])
        cube(size = [18.0988, 36.1998, 16.2938], center = true);
      }
    }
  
    difference() {
      union() {
        translate([1.376, 0.77, 7.4245])
        rotate([180, 0, 180])
        cylinder(h = 21.3507, r1 = 0.9, r2 = 0.9, center = true, $fn = 12);
      
        translate([-7.906, 0.8425, -2.649])
        cube(size = [20.3877, 1.9267, 1.2037], center = true);
      
        translate([1.793, 0.368, 8.0265])
        cylinder(h = 20.1467, r1 = 0.495, r2 = 0.495, center = true, $fn = 12);
      }
    
      union() {
        translate([-0.001, 1.573, 0])
        cylinder(h = 36.1998, r1 = 1.81, r2 = 1.81, center = true, $fn = 12);
      
        translate([-7.16463, 8.749, 4.1365])
        rotate([90, 30, 0])
        cube(size = [19.6538, 36.1998, 18.7018], center = true);
      
        translate([0, -9.1105, 4.44089e-16])
        rotate([90, 40, 0])
        cube(size = [36.1998, 36.1998, 17.9788], center = true);
      }
    }
  }

  translate([0, 0, 0.0005])
  cube(size = [11.9997, 4.3337, 9.2467], center = true);
}
